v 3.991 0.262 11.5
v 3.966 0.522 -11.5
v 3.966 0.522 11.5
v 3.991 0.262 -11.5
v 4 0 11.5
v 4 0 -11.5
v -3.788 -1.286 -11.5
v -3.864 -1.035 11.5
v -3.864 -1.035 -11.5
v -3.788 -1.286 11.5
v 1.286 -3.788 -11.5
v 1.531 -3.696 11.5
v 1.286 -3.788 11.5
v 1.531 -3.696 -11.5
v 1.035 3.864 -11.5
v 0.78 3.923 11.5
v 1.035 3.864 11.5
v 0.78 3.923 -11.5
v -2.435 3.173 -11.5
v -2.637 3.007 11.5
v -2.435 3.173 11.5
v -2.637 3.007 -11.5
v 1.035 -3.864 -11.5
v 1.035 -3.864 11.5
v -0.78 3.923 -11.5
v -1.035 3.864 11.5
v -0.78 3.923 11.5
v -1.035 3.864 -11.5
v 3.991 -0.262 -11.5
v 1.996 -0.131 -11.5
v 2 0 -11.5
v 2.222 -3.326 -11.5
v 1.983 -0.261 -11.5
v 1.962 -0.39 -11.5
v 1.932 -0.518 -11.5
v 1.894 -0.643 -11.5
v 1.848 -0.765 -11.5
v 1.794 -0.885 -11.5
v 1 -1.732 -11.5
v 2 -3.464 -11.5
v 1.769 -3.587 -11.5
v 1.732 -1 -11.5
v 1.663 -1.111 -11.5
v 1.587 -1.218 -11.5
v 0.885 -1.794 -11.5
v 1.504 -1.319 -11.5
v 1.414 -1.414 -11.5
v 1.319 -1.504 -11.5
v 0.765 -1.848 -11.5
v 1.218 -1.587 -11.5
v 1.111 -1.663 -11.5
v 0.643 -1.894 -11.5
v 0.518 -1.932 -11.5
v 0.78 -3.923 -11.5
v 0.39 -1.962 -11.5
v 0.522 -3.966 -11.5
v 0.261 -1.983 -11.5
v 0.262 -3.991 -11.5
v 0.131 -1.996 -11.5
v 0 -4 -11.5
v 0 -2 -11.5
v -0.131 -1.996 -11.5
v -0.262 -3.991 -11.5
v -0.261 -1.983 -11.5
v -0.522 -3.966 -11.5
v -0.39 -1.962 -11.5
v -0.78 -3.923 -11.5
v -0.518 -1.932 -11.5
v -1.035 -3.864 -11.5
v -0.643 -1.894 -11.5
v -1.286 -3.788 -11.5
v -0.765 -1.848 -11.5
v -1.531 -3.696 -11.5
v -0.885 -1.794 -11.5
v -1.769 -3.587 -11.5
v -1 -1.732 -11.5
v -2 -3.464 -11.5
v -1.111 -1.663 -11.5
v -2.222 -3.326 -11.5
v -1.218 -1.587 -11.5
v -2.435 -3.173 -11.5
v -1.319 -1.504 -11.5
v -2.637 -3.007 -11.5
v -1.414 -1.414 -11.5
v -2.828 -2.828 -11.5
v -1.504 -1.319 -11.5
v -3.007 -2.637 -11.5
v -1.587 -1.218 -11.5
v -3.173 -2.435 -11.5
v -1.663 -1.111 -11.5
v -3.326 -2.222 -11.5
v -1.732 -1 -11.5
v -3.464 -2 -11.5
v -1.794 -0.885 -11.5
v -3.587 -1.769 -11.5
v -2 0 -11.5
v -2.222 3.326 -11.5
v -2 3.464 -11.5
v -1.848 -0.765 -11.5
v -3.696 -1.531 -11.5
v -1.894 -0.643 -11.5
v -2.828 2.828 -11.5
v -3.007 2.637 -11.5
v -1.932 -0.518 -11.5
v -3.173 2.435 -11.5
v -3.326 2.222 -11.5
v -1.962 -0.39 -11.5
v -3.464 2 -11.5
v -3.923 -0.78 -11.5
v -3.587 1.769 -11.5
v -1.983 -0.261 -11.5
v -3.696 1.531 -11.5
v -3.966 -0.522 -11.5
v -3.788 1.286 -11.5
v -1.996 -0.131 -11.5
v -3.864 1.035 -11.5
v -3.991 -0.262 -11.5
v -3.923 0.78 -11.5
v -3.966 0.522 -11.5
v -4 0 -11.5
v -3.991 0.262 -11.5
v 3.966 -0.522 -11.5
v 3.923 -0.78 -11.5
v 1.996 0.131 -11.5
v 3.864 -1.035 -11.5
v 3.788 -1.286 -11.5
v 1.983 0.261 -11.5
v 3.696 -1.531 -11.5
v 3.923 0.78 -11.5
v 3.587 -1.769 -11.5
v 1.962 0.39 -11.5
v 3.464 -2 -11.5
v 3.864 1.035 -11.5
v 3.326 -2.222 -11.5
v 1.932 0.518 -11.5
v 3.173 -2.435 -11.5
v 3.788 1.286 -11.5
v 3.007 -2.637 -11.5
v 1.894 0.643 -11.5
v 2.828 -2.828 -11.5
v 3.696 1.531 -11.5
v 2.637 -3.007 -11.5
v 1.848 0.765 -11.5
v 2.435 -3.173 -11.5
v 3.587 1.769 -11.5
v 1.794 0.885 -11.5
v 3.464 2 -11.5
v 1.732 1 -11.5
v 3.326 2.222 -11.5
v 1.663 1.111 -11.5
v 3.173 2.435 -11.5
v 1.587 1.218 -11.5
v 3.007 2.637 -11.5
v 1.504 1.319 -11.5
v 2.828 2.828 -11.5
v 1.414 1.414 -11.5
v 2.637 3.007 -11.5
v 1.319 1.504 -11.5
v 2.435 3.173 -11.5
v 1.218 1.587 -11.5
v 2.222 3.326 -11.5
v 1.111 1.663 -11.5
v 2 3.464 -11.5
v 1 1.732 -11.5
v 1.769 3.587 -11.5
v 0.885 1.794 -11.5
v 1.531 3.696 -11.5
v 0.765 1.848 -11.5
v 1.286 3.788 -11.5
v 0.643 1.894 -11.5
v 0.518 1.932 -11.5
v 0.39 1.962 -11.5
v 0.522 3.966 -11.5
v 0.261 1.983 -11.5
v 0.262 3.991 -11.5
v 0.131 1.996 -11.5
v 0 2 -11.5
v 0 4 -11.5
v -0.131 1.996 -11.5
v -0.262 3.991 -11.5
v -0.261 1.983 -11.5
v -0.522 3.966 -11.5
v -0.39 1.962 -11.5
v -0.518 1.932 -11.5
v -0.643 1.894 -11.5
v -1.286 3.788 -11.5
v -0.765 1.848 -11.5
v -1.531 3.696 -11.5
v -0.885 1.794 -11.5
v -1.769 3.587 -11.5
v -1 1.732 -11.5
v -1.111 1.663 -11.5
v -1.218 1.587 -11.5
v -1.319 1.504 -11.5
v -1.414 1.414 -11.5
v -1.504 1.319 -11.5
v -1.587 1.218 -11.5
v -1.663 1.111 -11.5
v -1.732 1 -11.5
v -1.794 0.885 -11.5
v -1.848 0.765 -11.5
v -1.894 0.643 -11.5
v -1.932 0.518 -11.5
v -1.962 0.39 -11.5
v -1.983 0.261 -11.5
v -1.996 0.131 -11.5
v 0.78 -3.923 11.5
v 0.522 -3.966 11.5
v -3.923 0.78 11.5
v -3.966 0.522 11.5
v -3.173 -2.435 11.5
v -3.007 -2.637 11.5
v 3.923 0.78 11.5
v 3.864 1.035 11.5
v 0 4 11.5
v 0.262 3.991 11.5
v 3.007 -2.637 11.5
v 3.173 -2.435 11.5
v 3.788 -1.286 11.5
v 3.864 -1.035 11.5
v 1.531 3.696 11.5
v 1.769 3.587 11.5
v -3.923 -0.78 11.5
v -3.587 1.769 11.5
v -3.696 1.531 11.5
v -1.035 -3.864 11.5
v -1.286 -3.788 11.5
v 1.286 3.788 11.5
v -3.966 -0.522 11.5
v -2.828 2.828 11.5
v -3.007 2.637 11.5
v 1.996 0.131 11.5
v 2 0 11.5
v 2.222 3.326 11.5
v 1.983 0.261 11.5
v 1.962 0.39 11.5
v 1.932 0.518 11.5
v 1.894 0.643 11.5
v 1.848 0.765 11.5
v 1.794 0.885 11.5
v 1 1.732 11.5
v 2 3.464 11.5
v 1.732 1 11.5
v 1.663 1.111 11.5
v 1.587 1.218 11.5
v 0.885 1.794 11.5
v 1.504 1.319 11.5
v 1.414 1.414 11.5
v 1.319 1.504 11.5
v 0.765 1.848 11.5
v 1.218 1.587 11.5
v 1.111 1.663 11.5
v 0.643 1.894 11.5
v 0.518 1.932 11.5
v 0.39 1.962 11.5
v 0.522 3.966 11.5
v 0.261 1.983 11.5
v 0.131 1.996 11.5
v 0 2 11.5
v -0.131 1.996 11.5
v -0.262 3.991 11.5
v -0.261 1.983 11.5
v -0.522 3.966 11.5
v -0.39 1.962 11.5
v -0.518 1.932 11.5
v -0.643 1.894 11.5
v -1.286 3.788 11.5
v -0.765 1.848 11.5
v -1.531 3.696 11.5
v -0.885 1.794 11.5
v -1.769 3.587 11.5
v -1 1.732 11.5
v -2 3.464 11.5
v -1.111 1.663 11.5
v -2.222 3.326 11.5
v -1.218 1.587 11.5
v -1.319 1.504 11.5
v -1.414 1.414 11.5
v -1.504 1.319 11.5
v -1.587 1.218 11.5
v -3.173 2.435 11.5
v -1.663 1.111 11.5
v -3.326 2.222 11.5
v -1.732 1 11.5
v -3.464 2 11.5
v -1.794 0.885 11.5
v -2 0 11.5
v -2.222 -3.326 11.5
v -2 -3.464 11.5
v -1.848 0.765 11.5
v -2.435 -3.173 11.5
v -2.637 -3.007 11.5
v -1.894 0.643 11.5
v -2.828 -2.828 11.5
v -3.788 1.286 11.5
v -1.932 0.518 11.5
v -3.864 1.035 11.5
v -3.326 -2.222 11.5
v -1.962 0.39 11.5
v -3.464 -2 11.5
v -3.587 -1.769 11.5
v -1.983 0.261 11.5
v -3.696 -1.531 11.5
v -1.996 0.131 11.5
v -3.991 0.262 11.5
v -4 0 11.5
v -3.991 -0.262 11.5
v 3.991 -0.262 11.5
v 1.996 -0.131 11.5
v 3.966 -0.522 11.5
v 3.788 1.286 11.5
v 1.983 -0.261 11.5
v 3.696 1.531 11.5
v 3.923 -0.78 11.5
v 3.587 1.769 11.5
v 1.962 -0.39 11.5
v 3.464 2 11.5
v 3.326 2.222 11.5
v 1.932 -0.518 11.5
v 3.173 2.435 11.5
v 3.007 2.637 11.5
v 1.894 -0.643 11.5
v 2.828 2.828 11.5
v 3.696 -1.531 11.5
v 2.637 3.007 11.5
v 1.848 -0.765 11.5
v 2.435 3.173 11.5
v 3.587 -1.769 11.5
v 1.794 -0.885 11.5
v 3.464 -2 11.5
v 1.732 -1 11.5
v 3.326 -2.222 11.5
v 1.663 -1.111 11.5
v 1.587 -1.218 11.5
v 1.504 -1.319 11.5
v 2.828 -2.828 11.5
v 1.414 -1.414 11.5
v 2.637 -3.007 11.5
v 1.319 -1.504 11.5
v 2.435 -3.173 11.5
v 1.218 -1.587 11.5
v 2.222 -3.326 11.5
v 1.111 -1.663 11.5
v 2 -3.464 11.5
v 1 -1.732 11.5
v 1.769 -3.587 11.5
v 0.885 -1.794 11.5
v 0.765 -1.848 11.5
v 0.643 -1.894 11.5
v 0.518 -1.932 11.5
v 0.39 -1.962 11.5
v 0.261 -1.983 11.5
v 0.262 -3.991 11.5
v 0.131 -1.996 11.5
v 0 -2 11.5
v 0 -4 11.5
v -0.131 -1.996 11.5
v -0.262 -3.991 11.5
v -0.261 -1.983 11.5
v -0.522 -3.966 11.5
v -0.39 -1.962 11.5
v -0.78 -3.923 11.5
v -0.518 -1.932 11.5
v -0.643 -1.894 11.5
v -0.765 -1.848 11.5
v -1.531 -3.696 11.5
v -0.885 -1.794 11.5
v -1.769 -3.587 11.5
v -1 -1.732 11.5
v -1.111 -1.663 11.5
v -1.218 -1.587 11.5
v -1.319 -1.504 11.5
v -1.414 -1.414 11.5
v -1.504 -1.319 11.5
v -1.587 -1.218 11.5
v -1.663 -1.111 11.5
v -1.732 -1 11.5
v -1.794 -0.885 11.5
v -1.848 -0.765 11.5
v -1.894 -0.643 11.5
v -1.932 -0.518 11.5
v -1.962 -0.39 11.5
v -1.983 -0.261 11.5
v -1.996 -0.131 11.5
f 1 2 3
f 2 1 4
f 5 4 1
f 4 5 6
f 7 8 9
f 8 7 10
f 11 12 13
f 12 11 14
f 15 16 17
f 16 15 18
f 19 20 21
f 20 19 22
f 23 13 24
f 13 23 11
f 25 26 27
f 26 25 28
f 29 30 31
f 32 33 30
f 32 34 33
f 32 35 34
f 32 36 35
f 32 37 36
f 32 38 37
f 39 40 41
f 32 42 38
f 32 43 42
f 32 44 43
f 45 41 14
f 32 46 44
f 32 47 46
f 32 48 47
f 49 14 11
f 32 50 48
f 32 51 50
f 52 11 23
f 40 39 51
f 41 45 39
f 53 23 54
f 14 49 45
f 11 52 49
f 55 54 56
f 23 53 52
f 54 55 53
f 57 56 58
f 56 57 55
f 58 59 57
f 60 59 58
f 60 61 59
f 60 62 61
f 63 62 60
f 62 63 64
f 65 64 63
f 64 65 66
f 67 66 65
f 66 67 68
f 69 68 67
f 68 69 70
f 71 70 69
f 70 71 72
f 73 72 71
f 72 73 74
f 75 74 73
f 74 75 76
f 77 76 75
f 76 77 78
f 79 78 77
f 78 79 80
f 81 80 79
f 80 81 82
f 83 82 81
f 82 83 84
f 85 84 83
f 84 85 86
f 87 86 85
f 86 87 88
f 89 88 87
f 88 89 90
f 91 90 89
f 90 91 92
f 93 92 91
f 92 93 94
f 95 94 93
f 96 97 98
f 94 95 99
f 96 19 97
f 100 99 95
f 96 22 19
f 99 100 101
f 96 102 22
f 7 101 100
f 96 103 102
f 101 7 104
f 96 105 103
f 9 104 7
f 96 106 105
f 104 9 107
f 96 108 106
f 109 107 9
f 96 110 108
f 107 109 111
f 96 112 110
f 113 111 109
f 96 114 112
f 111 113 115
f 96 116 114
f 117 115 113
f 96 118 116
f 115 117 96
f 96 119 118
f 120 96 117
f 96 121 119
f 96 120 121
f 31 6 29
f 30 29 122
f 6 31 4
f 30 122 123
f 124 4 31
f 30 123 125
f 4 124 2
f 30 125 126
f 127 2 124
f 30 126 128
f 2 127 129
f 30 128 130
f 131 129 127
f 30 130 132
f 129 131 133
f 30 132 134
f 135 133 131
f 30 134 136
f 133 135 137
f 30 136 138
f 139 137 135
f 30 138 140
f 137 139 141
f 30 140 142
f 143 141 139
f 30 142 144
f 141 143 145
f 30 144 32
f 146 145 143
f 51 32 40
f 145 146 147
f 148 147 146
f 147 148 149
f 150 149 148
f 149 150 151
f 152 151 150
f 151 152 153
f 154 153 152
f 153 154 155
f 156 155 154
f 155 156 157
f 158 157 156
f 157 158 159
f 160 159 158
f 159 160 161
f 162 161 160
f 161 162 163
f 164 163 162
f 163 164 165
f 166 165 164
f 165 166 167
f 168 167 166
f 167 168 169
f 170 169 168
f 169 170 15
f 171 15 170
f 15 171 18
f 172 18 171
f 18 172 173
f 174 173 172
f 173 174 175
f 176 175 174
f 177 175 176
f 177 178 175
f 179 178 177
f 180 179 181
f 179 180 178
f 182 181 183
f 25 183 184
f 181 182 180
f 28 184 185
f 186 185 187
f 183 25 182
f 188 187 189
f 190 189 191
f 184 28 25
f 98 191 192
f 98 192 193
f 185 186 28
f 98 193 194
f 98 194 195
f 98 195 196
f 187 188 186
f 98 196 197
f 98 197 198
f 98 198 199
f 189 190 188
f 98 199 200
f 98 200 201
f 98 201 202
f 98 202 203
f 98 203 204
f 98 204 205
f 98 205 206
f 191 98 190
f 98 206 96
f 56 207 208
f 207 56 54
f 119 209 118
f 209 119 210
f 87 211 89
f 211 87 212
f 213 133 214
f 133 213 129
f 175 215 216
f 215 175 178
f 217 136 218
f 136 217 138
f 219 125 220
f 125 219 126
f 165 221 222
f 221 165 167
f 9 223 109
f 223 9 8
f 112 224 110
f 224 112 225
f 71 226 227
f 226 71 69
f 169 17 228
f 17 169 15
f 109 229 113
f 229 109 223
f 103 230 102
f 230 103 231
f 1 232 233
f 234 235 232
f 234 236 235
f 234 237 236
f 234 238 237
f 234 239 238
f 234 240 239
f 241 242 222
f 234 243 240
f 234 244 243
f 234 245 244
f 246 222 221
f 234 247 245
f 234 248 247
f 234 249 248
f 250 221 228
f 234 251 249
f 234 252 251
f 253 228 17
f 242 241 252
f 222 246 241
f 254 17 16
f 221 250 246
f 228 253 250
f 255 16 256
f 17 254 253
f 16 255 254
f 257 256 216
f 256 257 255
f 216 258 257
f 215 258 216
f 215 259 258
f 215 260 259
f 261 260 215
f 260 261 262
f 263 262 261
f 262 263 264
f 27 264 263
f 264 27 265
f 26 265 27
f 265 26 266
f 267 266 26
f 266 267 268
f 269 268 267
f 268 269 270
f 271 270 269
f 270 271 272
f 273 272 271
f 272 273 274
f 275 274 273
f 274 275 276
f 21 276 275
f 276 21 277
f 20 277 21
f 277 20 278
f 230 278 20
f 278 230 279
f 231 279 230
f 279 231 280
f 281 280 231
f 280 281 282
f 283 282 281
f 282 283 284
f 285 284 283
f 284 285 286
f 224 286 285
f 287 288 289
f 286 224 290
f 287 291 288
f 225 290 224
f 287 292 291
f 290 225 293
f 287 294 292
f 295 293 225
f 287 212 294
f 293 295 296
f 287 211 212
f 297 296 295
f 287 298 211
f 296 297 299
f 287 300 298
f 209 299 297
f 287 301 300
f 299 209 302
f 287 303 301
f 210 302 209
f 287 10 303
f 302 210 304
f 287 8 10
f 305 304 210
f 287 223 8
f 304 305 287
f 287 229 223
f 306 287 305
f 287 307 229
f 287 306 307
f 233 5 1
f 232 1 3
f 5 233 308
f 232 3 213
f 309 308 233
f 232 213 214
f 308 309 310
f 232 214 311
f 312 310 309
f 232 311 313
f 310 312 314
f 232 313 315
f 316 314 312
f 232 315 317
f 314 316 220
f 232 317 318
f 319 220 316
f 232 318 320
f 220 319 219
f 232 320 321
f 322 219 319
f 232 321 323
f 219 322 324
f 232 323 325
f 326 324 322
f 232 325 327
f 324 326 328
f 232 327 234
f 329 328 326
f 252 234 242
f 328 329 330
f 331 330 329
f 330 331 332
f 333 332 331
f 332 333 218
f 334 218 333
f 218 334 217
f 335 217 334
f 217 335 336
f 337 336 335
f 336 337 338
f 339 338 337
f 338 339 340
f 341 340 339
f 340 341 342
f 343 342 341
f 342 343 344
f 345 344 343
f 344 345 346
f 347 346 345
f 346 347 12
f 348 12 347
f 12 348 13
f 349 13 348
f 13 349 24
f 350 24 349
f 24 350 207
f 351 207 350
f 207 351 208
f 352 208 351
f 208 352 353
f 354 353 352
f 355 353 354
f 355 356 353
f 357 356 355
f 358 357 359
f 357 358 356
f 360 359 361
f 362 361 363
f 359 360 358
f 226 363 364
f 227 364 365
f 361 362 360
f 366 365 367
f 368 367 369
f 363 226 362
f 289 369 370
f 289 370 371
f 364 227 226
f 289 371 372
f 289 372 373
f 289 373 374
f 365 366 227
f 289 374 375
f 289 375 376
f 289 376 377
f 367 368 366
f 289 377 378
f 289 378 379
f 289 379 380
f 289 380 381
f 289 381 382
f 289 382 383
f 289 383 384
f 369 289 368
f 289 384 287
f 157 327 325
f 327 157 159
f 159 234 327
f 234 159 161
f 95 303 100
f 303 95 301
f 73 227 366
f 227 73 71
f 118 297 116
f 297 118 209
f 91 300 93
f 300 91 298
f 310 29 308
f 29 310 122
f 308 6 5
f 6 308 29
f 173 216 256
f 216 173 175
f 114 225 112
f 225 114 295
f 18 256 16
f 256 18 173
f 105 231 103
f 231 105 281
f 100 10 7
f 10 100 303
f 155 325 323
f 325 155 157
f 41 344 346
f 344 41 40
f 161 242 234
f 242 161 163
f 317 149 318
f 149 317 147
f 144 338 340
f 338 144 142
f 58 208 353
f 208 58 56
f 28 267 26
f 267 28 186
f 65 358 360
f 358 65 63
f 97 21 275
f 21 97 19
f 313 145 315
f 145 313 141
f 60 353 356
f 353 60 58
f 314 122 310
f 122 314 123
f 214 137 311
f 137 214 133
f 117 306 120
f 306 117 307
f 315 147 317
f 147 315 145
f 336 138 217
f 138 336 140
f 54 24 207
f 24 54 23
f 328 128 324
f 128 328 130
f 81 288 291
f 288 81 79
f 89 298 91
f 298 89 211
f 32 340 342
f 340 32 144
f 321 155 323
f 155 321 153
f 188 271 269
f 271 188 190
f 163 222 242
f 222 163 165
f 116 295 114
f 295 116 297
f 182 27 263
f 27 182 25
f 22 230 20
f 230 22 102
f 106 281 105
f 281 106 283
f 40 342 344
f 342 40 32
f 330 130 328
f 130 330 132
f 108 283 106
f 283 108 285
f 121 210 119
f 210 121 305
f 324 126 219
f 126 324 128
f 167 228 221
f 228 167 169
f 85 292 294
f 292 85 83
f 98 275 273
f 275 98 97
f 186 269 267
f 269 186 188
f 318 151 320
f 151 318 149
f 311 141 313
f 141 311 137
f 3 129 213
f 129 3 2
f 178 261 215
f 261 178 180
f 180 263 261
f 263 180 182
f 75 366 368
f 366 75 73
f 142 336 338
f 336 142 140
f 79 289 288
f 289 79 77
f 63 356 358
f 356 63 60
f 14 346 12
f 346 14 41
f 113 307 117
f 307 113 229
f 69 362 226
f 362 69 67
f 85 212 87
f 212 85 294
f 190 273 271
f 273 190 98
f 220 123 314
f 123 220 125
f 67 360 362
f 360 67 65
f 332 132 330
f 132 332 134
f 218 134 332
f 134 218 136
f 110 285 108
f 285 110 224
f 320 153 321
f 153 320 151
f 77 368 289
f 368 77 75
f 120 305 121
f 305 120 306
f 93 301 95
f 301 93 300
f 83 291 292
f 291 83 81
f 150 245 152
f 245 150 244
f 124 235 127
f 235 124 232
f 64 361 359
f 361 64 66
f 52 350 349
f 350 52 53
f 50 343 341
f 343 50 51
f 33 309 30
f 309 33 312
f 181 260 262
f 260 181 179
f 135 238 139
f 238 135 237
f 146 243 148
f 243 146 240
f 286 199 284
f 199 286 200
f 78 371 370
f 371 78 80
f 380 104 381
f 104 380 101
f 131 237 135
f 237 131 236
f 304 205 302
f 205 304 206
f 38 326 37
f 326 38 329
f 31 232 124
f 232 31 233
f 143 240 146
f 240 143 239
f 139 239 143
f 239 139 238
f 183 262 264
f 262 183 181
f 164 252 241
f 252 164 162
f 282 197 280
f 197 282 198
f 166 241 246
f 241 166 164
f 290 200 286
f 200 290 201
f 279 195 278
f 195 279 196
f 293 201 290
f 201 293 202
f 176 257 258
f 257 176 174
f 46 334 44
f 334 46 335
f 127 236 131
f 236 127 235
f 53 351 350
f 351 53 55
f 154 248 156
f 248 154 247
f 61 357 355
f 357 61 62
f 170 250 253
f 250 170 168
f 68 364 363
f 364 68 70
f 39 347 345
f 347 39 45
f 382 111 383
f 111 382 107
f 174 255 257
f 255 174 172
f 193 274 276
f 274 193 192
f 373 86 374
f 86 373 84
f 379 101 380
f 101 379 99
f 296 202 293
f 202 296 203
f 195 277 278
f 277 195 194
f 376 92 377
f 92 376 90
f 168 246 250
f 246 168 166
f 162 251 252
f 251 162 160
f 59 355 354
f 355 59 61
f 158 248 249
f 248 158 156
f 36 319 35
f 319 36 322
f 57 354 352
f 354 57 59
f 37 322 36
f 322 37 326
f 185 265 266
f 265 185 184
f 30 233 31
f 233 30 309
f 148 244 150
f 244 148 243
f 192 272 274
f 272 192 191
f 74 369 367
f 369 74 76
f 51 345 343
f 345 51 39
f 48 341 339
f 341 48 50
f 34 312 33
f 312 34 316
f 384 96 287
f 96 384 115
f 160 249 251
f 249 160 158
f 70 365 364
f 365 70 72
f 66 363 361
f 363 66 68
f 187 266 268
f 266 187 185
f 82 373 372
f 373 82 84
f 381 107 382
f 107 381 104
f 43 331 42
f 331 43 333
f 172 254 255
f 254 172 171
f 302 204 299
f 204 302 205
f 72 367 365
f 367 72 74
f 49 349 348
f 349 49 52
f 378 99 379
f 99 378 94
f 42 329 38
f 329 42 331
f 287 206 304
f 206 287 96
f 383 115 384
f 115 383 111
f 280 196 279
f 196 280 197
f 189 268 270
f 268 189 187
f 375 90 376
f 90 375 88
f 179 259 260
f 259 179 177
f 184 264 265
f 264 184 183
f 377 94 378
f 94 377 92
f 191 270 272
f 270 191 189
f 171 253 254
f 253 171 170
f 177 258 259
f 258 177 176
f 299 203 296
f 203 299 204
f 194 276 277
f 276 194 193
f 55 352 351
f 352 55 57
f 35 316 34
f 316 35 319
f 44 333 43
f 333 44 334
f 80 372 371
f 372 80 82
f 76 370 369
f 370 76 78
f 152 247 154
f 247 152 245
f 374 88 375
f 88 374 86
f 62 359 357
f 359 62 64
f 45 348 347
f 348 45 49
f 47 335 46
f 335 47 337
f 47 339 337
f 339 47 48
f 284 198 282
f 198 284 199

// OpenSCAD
$fn=96;

module linear_bearing(bore_d=4.0, od_d=8.0, len=23.0) {
    difference() {
        cylinder(d=od_d, h=len, center=true);
        cylinder(d=bore_d, h=len+0.4, center=true);
    }
}

linear_bearing();
